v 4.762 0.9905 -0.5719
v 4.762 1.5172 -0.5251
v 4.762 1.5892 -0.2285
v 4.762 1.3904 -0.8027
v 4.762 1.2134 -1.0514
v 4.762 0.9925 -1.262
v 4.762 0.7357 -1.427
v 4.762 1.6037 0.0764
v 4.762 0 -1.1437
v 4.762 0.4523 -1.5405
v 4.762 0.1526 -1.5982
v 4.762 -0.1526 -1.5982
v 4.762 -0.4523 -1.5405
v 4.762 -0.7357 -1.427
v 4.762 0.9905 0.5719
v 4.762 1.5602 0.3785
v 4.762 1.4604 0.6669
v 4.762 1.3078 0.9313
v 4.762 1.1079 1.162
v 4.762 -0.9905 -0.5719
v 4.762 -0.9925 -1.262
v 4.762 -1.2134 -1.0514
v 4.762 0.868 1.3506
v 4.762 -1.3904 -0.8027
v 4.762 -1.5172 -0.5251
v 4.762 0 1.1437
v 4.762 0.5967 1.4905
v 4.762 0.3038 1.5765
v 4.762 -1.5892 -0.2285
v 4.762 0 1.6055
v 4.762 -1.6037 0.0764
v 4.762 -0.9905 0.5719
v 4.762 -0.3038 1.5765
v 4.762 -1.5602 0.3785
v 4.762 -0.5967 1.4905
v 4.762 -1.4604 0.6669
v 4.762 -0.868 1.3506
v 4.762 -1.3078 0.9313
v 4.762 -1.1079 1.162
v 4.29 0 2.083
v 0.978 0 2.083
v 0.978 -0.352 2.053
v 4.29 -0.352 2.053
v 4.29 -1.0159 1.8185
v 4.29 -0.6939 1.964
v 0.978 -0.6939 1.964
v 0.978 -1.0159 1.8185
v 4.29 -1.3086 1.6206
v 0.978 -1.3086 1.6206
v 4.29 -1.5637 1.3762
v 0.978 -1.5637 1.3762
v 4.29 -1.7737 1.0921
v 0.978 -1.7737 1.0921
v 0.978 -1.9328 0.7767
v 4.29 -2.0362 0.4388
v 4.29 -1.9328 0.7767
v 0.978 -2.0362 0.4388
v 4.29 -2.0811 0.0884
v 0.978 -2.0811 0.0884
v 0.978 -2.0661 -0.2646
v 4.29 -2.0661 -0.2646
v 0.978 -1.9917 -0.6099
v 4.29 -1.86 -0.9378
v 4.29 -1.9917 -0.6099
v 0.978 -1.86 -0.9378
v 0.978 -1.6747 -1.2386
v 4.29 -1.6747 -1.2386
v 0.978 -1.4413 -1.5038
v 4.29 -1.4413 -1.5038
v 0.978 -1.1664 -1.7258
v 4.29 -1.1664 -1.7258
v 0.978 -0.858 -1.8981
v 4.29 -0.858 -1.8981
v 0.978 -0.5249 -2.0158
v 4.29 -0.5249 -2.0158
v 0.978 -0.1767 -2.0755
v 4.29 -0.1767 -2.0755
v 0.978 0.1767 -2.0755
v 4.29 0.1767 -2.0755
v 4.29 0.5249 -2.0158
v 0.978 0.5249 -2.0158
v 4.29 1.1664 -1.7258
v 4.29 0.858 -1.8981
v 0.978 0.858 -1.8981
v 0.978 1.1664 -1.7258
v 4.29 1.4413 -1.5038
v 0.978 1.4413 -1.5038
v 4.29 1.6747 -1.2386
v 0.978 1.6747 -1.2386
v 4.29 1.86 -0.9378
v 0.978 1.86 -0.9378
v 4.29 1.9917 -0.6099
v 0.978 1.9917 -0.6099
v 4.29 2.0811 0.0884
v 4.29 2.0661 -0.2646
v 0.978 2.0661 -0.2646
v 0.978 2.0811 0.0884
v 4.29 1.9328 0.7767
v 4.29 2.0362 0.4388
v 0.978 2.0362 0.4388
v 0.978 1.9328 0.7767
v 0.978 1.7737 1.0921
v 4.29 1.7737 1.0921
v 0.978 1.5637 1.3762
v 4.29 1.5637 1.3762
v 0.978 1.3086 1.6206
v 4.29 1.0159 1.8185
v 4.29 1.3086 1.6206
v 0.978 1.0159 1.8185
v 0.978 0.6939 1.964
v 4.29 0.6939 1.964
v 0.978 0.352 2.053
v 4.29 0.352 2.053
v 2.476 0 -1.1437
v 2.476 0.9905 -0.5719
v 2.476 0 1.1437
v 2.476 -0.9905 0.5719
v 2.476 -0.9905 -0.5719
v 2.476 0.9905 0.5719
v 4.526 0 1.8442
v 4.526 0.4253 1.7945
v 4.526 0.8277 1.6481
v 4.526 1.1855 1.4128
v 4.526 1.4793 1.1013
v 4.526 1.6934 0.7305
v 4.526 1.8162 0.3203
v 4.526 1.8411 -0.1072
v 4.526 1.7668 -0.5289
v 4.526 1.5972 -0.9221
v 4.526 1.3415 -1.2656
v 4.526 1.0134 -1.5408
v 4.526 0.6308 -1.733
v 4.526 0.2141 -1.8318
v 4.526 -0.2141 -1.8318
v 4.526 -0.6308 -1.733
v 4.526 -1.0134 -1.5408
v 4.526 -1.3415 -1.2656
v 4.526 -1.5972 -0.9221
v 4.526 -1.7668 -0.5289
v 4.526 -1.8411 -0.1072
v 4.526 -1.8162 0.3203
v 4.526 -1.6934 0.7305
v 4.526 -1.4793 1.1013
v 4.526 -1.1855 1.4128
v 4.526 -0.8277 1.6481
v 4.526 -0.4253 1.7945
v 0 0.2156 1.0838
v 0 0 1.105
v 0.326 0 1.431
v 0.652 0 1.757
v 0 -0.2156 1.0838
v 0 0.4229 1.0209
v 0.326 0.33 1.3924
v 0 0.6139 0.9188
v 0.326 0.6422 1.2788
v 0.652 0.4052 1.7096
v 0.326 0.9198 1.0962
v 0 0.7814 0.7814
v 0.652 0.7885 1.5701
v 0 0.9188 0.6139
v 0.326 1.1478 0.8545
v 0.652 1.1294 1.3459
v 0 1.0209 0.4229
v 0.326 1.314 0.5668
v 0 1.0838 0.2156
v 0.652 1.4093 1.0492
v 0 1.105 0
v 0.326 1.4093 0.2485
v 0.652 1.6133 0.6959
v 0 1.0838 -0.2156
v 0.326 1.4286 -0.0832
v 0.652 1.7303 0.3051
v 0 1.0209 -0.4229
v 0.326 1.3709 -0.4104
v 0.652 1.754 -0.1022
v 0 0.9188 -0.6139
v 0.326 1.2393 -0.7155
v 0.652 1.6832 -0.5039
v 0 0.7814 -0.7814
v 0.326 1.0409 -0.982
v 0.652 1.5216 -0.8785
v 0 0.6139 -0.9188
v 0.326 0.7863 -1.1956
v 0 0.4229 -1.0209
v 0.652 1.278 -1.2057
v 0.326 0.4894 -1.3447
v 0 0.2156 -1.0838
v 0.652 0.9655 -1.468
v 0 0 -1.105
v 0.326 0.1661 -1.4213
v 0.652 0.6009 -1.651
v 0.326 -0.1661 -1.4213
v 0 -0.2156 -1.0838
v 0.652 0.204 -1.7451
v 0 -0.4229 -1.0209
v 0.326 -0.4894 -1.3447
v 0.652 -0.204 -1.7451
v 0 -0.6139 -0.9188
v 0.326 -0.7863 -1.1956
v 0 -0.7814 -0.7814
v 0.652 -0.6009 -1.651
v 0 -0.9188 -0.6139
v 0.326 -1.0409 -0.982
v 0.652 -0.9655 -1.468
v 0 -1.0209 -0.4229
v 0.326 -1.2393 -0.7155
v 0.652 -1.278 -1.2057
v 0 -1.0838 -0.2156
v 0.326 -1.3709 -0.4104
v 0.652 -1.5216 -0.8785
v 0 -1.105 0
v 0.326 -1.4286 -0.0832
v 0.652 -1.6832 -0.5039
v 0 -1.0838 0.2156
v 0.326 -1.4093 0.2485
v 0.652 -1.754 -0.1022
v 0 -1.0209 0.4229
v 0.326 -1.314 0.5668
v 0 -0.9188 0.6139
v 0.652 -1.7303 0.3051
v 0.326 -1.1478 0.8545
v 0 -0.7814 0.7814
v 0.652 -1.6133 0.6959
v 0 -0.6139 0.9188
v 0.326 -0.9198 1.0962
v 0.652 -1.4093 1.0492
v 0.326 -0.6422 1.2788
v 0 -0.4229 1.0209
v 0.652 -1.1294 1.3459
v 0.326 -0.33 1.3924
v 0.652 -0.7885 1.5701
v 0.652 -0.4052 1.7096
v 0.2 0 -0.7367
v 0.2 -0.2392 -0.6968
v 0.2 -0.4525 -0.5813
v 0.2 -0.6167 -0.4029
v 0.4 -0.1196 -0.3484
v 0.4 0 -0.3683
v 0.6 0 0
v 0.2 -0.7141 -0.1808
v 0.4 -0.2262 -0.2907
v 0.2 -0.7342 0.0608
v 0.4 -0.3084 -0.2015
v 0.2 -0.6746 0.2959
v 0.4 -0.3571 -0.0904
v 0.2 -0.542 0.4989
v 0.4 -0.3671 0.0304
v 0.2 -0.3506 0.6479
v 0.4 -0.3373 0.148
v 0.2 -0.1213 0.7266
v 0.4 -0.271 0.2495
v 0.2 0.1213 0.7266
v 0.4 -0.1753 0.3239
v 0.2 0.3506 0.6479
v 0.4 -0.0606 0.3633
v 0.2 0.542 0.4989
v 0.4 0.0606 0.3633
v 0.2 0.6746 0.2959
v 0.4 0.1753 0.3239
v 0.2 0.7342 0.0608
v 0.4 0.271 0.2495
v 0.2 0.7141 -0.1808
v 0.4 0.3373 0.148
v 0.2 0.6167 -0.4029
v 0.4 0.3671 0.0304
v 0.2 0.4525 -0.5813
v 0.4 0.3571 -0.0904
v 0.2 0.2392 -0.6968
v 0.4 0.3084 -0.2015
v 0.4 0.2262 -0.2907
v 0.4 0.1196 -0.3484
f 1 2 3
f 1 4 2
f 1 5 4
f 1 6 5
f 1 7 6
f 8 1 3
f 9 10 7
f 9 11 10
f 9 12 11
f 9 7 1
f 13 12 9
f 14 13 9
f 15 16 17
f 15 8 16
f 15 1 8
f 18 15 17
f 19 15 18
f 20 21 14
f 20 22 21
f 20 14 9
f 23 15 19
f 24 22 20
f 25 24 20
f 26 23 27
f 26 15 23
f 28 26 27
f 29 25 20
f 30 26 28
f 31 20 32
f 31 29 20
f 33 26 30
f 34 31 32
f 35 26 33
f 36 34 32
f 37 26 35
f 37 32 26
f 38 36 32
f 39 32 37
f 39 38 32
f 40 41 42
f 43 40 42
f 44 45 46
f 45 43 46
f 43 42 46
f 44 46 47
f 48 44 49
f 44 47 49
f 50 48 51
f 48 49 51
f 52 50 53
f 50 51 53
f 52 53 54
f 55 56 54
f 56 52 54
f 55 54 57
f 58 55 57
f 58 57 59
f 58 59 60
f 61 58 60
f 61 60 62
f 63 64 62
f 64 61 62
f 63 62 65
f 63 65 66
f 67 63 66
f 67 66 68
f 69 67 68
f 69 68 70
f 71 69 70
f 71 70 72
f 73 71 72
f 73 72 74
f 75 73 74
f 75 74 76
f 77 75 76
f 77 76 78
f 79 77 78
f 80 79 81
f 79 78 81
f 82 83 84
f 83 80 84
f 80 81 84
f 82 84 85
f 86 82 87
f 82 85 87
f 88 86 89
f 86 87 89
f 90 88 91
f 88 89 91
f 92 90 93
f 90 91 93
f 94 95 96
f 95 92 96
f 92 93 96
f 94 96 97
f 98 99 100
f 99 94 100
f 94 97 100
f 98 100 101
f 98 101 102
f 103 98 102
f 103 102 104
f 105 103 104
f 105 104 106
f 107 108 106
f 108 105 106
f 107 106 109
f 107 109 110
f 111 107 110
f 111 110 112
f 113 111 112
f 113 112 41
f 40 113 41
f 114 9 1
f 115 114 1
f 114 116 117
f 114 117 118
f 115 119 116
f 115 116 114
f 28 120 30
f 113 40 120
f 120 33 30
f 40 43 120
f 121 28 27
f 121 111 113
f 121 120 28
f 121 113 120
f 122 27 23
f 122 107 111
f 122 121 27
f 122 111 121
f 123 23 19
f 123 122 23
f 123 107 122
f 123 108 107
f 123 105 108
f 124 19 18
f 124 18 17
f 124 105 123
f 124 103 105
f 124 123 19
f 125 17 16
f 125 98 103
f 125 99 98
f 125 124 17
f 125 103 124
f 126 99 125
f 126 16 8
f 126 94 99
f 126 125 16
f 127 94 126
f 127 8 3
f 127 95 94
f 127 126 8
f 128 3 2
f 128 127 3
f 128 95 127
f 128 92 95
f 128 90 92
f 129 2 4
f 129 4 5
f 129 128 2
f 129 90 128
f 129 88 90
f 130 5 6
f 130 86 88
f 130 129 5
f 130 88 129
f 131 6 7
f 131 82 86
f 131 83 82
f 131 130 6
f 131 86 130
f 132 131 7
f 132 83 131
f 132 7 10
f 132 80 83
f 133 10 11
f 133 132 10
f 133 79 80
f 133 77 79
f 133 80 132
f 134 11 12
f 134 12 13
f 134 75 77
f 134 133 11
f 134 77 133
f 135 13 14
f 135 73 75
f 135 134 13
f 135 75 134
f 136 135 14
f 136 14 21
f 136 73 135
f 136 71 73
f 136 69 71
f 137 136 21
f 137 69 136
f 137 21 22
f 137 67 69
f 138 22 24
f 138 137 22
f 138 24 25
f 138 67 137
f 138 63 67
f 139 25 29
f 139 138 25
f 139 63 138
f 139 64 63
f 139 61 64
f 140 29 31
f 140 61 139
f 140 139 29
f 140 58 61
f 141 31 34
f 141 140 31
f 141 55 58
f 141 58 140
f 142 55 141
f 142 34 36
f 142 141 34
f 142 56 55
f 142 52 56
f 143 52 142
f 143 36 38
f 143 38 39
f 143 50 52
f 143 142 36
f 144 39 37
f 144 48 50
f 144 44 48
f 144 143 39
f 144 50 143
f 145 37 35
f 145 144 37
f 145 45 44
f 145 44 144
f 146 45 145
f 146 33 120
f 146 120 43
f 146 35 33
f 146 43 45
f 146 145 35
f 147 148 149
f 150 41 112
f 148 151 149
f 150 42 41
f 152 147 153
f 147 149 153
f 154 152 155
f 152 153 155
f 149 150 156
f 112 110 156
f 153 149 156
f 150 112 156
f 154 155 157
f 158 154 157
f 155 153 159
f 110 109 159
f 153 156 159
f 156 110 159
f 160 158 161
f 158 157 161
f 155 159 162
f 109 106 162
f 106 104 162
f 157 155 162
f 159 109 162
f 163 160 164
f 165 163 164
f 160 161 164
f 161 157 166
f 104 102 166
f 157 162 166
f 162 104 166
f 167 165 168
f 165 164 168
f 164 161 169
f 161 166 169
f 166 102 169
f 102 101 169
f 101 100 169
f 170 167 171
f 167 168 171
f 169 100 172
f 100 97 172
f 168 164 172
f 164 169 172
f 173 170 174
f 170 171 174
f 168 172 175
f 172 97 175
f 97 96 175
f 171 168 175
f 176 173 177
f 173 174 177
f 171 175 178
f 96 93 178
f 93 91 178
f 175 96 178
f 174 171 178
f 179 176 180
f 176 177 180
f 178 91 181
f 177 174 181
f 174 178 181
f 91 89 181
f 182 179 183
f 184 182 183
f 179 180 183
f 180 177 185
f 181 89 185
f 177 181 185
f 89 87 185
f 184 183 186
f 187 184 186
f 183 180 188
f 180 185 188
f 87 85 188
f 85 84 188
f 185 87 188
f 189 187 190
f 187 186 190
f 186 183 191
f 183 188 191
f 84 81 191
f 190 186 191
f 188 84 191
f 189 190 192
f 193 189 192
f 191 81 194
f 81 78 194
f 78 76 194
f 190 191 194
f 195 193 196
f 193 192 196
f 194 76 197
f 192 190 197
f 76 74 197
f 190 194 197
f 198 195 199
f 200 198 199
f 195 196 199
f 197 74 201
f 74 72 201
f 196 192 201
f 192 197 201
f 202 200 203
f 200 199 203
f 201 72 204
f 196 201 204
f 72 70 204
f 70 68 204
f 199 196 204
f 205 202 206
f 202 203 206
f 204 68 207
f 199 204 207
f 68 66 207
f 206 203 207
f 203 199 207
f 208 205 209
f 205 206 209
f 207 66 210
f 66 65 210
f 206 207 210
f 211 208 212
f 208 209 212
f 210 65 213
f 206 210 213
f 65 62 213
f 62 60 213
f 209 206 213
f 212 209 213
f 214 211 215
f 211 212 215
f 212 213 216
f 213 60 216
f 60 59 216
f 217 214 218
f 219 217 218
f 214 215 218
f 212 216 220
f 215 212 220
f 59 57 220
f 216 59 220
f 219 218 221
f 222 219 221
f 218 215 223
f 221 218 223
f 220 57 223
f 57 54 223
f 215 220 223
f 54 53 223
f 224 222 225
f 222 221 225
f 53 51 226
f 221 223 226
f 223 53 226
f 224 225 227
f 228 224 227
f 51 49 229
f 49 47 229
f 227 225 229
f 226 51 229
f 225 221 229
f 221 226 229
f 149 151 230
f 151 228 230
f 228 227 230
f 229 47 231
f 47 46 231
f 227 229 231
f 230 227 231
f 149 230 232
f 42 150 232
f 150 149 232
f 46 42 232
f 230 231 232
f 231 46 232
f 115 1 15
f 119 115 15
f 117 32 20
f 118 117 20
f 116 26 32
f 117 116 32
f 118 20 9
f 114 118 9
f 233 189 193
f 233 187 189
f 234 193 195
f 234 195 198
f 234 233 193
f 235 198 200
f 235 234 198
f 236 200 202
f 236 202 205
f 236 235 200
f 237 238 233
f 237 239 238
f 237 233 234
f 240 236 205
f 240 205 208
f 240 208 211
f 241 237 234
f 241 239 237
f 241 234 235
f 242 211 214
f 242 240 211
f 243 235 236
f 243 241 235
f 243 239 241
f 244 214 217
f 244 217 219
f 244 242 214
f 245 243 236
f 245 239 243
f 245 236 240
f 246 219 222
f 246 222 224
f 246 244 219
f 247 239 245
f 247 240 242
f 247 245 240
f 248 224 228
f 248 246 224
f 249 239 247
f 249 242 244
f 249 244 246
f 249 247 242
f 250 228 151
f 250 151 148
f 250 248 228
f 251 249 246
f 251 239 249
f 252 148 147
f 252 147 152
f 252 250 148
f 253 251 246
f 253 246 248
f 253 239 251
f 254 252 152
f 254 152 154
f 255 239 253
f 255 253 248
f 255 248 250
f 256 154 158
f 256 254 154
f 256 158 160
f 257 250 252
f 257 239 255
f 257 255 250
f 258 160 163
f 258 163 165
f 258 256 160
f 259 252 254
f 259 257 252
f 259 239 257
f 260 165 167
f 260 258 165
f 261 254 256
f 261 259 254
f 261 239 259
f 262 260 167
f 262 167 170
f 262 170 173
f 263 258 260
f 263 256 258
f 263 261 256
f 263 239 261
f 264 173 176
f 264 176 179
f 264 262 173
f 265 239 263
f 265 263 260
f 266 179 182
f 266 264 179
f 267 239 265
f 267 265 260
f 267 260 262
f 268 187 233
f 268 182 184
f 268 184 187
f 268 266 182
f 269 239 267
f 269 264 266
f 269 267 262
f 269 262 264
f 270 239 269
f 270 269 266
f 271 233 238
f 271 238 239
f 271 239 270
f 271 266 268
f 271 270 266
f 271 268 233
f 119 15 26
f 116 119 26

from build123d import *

# Parameters (mm, degrees)
SKETCH1_R           = 2.083
BOSS_EXTRUDE1_DEPTH = 4.762
CUT_EXTRUDE1_DEPTH  = 2.286


with BuildPart() as part:
    # Sketch1 → Boss-Extrude1 (new body)
    with BuildSketch(Plane(origin=(0, 0, 0), x_dir=(0, 0, -1), z_dir=(1, 0, 0))):
        with Locations(Location((0, 0, 0), (0, 0, 180))):
            Circle(SKETCH1_R)
    extrude(amount=BOSS_EXTRUDE1_DEPTH)

    # Sketch2 → Cut-Revolve1 (revolve, cut)
    with BuildSketch(Plane.XY, mode=Mode.PRIVATE) as cut_revolve1_sk:
        Polygon((0, 1.105), (0.978, 2.083), (0, 2.083), align=None)
    revolve(cut_revolve1_sk.sketch.rotate(Axis((4.762, 0, 0), (-1, 0, 0)), 270), axis=Axis((4.762, 0, 0), (-1, 0, 0)), mode=Mode.SUBTRACT)

    # Sketch3 → Cut-Revolve2 (revolve, cut)
    with BuildSketch(Plane.XY, mode=Mode.PRIVATE) as cut_revolve2_sk:
        Polygon((4.29, 2.083), (4.762, 2.083), (4.762, 1.6055), align=None)
    revolve(cut_revolve2_sk.sketch.rotate(Axis((4.762, 0, 0), (-1, 0, 0)), 270), axis=Axis((4.762, 0, 0), (-1, 0, 0)), mode=Mode.SUBTRACT)

    # Sketch11 → Cut-Revolve5 (revolve, cut)
    with BuildSketch(Plane.XY, mode=Mode.PRIVATE) as cut_revolve5_sk:
        Polygon((0, 0), (0, 1.105), (0.6, 0), align=None)
    revolve(cut_revolve5_sk.sketch.rotate(Axis((4.762, 0, 0), (-1, 0, 0)), 90), axis=Axis((4.762, 0, 0), (-1, 0, 0)), mode=Mode.SUBTRACT)

    # Sketch12 → Cut-Extrude1 (cut)
    with BuildSketch(Plane(origin=(4.762, 0, 0), x_dir=(0, 0, -1), z_dir=(1, 0, 0))):
        Polygon((0.571865442, 0.9905), (-0.571865442, 0.9905), (-1.143730883, 0), (-0.571865442, -0.9905), (0.571865442, -0.9905), (1.143730883, 0), align=None)
    extrude(amount=-CUT_EXTRUDE1_DEPTH, mode=Mode.SUBTRACT)


solid = part.part
